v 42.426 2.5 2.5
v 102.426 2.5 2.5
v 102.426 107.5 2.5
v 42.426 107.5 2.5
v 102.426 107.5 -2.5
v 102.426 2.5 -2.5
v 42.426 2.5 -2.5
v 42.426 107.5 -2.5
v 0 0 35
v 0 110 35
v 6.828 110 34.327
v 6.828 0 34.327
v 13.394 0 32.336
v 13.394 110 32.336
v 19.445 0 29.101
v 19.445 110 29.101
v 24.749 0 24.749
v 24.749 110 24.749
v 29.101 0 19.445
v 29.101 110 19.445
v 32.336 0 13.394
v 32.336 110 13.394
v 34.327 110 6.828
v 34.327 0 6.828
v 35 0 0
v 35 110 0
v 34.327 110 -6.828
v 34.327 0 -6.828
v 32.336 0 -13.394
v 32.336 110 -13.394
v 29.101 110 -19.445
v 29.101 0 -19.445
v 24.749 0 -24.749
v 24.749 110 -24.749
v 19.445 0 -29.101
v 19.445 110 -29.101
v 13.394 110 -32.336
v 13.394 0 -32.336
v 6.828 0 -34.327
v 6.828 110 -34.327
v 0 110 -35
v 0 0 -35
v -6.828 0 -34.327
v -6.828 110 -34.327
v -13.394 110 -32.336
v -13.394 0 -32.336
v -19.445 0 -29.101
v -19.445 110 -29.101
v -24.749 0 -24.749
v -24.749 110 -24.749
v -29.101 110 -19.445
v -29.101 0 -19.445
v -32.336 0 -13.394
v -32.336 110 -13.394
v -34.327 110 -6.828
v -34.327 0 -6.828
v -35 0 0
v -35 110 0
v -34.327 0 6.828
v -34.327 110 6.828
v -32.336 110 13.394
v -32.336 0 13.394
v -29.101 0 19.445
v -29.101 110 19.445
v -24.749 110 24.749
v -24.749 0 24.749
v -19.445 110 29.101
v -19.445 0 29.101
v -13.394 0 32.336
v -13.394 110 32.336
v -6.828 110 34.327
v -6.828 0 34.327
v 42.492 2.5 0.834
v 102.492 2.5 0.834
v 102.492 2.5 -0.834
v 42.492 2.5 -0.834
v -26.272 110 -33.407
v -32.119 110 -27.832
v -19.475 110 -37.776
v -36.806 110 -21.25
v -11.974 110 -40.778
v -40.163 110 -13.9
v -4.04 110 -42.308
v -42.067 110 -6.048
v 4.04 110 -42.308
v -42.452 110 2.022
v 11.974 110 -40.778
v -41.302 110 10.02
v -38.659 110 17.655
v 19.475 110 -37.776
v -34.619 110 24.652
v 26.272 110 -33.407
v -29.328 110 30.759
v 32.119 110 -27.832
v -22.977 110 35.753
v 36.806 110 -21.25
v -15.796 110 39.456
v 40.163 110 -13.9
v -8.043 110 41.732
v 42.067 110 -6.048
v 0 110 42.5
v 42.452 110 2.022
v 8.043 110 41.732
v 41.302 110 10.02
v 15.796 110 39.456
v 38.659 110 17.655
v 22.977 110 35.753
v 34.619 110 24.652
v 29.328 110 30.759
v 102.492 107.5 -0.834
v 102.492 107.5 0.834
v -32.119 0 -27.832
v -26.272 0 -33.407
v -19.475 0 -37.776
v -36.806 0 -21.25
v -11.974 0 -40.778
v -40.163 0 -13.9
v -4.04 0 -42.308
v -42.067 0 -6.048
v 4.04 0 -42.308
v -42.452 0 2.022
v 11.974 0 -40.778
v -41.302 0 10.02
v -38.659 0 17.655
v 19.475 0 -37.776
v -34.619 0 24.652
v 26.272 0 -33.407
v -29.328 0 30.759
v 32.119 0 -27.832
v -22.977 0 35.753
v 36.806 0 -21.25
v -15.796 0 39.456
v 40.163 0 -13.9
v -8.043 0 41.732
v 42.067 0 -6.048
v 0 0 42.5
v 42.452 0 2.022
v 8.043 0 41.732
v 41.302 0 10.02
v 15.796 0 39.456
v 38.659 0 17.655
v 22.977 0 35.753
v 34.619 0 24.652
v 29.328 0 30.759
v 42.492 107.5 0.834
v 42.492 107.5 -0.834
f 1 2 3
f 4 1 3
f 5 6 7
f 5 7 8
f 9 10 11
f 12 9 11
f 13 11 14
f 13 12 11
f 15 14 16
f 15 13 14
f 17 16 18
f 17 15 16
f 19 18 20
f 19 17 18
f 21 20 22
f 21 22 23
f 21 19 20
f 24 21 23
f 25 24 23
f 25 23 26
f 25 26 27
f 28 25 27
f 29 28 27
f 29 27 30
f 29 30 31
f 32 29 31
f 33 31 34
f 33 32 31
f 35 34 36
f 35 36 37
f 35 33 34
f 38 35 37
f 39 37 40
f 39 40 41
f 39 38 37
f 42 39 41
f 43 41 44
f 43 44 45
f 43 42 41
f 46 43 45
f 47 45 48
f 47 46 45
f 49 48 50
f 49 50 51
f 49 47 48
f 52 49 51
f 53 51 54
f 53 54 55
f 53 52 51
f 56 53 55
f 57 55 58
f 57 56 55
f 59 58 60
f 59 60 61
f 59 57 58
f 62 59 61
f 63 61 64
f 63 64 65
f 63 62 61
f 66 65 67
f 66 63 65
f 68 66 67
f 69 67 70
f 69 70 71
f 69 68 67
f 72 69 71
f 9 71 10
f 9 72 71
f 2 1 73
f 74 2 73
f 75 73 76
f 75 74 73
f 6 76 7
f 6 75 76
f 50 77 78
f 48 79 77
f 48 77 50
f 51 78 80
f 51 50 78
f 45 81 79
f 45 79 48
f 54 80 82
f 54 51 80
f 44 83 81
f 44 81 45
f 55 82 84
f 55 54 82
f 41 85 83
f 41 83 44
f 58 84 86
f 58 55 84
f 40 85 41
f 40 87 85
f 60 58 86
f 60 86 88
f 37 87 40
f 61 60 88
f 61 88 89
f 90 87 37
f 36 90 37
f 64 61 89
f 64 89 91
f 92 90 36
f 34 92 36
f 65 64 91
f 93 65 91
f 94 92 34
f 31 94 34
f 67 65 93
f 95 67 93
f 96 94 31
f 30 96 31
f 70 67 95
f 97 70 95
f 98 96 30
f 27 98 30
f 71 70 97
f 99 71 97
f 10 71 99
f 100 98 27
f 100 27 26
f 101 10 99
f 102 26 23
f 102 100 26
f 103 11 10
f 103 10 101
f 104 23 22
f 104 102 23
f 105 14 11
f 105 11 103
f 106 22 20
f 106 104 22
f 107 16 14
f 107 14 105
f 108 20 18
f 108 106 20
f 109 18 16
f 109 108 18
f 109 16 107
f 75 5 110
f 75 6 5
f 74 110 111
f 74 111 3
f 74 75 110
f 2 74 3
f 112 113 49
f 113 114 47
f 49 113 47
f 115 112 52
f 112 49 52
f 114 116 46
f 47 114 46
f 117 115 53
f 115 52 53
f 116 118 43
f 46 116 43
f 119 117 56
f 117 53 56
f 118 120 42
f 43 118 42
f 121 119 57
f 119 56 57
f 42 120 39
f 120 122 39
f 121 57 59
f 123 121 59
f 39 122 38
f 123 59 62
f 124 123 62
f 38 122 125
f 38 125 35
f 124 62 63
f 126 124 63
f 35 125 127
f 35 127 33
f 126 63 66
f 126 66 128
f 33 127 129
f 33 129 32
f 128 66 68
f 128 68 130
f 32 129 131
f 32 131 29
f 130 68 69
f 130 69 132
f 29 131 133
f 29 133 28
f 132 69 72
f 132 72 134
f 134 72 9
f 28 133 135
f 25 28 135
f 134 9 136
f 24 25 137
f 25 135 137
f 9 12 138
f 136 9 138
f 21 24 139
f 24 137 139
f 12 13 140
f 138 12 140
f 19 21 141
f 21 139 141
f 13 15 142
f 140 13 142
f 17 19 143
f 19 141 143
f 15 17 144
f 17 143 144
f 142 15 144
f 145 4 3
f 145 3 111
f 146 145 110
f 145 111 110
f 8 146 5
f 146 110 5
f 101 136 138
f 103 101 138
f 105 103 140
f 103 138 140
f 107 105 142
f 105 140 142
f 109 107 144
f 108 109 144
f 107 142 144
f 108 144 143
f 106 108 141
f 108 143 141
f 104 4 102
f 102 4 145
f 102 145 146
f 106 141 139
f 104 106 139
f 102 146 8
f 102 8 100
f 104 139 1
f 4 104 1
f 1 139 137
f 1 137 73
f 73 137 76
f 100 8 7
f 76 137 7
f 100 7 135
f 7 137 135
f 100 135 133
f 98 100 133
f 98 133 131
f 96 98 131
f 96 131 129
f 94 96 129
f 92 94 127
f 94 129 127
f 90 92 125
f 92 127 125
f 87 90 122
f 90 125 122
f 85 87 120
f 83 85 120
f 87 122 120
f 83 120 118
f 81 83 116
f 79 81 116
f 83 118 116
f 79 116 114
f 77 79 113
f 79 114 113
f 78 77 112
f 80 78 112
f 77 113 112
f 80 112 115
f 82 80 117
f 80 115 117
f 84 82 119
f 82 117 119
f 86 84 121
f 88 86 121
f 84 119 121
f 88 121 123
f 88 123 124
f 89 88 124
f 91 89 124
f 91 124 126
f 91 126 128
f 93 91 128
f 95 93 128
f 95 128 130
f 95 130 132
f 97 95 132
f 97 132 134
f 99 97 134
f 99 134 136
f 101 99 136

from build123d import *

# Parameters (mm, degrees)
SKETCH1_R                  = 42.5
SKETCH1_R_2                = 35
BOSS_EXTRUDE1_DEPTH        = 110
BOSS_EXTRUDE2_REACH        = 187.35
BOSS_EXTRUDE2_START_RADIUS = 42.5
BOSS_EXTRUDE2_END_RADIUS   = 42.5
SKETCH2_W                  = 5
SKETCH2_H                  = 105


with BuildPart() as part:
    # Sketch1 → Boss-Extrude1 (new body)
    with BuildSketch(Plane(origin=(0, 0, 0), x_dir=(1, 0, 0), z_dir=(0, 1, 0))):
        with Locations(Location((0, 0, 0), (0, 0, 270))):
            Circle(SKETCH1_R)
        with Locations(Location((0, 0, 0), (0, 0, 270))):
            Circle(SKETCH1_R_2, mode=Mode.SUBTRACT)
    extrude(amount=BOSS_EXTRUDE1_DEPTH)

    # Boss-Extrude2: from a cylinder face, 187.35 long prism both ways, kept between that surface and its translate by the depth
    boss_extrude2_start = Plane(origin=(0, 55, 0), z_dir=(0, -1, 0)) * Cylinder(BOSS_EXTRUDE2_START_RADIUS, 460.7, mode=Mode.PRIVATE)
    boss_extrude2_end = Plane(origin=(60, 55, 0), z_dir=(0, -1, 0)) * Cylinder(BOSS_EXTRUDE2_END_RADIUS, 460.7, mode=Mode.PRIVATE)
    # Sketch2 → Boss-Extrude2 (add, from a surface)
    with BuildSketch(Plane(origin=(0, 0, 0), x_dir=(0, 0, -1), z_dir=(1, 0, 0)), mode=Mode.PRIVATE) as boss_extrude2_sk1:
        with Locations((0, 55)):
            Rectangle(SKETCH2_W, SKETCH2_H)
    boss_extrude2_tool1 = extrude(boss_extrude2_sk1.sketch, amount=BOSS_EXTRUDE2_REACH, both=True, mode=Mode.PRIVATE)
    add(((boss_extrude2_tool1 - boss_extrude2_start) & boss_extrude2_end).solids().sort_by_distance((72.426407, 55, 0))[0])


solid = part.part
